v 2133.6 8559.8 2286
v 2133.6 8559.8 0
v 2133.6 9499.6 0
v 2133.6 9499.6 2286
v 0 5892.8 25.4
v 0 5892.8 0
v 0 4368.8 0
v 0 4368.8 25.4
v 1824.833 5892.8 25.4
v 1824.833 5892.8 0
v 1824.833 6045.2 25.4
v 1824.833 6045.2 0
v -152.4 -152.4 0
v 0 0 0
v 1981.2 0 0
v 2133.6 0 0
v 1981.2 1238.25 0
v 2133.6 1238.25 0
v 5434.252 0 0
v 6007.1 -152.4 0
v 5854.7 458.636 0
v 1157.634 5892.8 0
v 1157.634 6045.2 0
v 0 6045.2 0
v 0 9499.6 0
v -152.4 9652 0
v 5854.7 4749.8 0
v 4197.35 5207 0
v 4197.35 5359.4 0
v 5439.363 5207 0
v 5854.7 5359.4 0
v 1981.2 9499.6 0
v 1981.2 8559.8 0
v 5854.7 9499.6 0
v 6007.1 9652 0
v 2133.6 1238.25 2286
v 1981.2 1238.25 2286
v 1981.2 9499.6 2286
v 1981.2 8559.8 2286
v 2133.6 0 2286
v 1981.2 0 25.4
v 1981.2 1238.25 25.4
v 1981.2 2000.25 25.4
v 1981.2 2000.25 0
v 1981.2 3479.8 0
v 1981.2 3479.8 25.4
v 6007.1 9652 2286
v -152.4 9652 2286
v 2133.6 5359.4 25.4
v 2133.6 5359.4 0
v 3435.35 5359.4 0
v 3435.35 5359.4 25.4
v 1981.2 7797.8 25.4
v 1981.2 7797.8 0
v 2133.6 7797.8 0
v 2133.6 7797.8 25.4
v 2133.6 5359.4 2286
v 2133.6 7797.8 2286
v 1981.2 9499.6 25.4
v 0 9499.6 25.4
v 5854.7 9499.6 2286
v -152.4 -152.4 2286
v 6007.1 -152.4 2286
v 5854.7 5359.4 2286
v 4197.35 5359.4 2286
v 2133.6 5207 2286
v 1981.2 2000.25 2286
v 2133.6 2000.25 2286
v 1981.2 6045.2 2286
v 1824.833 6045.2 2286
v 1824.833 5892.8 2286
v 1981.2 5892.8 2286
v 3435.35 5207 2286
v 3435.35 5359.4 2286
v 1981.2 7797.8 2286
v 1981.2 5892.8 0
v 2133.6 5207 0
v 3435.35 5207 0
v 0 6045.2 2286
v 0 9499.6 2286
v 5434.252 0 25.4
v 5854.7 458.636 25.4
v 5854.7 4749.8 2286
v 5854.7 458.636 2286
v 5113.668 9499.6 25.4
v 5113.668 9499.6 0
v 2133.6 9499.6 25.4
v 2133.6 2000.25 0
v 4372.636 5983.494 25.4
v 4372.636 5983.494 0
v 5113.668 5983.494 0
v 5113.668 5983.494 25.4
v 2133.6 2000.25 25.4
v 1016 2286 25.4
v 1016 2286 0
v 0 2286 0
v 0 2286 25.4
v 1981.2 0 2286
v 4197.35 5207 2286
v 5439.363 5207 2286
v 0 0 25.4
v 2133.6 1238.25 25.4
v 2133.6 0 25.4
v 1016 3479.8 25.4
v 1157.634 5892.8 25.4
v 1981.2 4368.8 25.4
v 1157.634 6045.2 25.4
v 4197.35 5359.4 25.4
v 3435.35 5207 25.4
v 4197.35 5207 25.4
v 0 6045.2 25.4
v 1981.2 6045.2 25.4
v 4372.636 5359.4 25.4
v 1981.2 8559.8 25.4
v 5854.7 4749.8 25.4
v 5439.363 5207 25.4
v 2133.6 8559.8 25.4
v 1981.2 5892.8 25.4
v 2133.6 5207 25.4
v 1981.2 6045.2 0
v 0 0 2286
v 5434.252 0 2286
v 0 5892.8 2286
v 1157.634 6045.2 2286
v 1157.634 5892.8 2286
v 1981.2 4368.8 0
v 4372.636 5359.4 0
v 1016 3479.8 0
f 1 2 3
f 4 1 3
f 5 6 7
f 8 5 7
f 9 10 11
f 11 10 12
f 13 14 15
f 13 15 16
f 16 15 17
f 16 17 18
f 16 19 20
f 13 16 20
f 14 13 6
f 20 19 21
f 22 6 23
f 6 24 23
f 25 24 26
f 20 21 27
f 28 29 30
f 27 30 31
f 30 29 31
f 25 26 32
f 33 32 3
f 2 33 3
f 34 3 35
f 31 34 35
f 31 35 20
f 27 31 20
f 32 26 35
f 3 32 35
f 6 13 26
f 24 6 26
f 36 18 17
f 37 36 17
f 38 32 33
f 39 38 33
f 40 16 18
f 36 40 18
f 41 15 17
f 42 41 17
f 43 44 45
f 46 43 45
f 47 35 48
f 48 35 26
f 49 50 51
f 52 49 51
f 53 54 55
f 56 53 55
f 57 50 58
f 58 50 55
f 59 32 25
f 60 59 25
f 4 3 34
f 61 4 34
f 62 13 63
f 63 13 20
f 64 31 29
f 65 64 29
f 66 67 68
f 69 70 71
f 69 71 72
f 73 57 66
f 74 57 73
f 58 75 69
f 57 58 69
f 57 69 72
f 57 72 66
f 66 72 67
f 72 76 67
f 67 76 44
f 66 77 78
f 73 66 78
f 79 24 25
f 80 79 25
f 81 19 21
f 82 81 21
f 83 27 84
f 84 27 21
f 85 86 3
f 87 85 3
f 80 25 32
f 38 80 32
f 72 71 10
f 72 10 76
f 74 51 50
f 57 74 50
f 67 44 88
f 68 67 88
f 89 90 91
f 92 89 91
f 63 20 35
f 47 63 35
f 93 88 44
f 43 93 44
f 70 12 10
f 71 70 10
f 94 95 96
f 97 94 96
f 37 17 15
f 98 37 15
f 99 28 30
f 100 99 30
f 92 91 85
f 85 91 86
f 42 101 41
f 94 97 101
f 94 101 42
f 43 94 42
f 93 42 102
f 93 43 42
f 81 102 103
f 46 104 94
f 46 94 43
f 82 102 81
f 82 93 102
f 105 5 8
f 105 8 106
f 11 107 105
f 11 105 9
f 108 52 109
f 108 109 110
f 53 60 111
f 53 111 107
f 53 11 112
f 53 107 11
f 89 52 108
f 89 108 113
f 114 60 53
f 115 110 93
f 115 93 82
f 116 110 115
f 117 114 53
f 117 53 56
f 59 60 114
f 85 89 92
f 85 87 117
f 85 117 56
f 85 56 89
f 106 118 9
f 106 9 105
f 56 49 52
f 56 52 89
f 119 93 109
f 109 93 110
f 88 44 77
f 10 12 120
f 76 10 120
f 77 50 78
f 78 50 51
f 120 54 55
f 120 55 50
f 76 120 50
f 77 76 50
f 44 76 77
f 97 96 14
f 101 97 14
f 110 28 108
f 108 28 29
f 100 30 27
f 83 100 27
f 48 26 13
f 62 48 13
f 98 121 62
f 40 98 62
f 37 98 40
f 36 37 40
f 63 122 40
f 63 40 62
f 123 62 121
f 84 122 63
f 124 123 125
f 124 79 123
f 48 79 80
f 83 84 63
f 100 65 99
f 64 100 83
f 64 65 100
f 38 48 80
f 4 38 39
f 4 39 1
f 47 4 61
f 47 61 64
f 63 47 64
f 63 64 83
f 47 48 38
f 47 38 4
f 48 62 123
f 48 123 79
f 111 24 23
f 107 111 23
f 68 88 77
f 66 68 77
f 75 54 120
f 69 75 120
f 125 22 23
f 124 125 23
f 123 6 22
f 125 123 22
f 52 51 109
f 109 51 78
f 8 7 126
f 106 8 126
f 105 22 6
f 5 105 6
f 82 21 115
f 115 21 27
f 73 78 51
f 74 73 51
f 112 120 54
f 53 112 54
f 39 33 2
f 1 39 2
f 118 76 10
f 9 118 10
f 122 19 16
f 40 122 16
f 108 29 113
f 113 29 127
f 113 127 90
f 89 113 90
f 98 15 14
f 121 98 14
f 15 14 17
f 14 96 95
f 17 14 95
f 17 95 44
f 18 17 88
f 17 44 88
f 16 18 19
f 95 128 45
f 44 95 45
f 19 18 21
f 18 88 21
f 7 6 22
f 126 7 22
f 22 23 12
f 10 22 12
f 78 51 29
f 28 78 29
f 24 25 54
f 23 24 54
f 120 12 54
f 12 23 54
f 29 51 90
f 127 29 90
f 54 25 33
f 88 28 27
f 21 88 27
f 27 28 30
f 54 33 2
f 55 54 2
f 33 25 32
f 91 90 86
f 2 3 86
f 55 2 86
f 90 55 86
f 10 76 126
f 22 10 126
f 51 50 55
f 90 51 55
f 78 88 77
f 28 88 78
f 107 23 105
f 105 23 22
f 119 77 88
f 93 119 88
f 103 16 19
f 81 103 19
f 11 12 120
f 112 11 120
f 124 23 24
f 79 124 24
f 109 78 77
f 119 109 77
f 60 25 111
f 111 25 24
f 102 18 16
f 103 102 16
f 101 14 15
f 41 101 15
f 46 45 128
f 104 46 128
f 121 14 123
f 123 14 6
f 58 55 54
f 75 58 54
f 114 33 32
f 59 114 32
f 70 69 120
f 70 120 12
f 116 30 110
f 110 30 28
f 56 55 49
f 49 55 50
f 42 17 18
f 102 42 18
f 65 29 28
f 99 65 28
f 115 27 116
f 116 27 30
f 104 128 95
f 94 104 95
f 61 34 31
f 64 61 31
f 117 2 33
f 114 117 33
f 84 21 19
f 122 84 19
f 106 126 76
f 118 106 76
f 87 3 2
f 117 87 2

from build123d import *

# Parameters (mm, degrees)
F1_DEPTH = 2286
F2_DEPTH = 25.4


with BuildPart() as f1:
    # F0 (on Top) → F1 (new body)
    with BuildSketch(Plane.XY):
        Polygon((6007.1, -152.4), (6007.1, 0), (6007.1, 9499.6), (6007.1, 9652), (5854.7, 9652), (0, 9652), (-152.4, 9652), (-152.4, 9499.6), (-152.4, 0), (-152.4, -152.4), (0, -152.4), (5854.7, -152.4), align=None)
        Polygon((5854.7, 458.635837), (5434.252262, 0), (2133.6, 0), (2133.6, 1238.25), (1981.2, 1238.25), (1981.2, 0), (0, 0), (0, 2286), (0, 4368.8), (0, 5892.8), (1157.634497, 5892.8), (1157.634497, 6045.2), (0, 6045.2), (0, 9499.6), (1981.2, 9499.6), (1981.2, 8559.8), (2133.6, 8559.8), (2133.6, 9499.6), (5113.667921, 9499.6), (5848.350048, 9499.6), (5854.7, 9499.6), (5854.7, 5983.494282), (5854.7, 5359.4), (5848.350048, 5359.4), (4372.635841, 5359.4), (4197.35, 5359.4), (4197.35, 5207), (5439.363331, 5207), (5854.7, 4749.8), align=None, mode=Mode.SUBTRACT)
        Polygon((1981.2, 5283.2), (1981.2, 4368.8), (1981.2, 3479.8), (1981.2, 2000.25), (2133.6, 2000.25), (2133.6, 3479.8), (2133.6, 4368.8), (2133.6, 5207), (3435.35, 5207), (3435.35, 5359.4), (2133.6, 5359.4), (2133.6, 5969), (2133.6, 7797.8), (1981.2, 7797.8), (1981.2, 6045.2), (1824.832678, 6045.2), (1824.832678, 5892.8), (1981.2, 5892.8), align=None)
    extrude(amount=F1_DEPTH)


with BuildPart() as f2:
    # F0 (on Top) → F2 (new body)
    with BuildSketch(Plane.XY):
        Polygon((2133.6, 0), (5434.252262, 0), (5854.7, 458.635837), (5854.7, 4749.8), (5439.363331, 5207), (4197.35, 5207), (4197.35, 5359.4), (4372.635841, 5359.4), (4372.635841, 5983.494282), (5113.667921, 5983.494282), (5113.667921, 9499.6), (2133.6, 9499.6), (2133.6, 8559.8), (1981.2, 8559.8), (1981.2, 9499.6), (0, 9499.6), (0, 6045.2), (1157.634497, 6045.2), (1157.634497, 5892.8), (0, 5892.8), (0, 4368.8), (1981.2, 4368.8), (1981.2, 5283.2), (1981.2, 5892.8), (1824.832678, 5892.8), (1824.832678, 6045.2), (1981.2, 6045.2), (1981.2, 7797.8), (2133.6, 7797.8), (2133.6, 5969), (2133.6, 5359.4), (3435.35, 5359.4), (3435.35, 5207), (2133.6, 5207), (2133.6, 4368.8), (2133.6, 3479.8), (2133.6, 2000.25), (1981.2, 2000.25), (1981.2, 3479.8), (1016, 3479.8), (1016, 2286), (0, 2286), (0, 0), (1981.2, 0), (1981.2, 1238.25), (2133.6, 1238.25), align=None)
    extrude(amount=F2_DEPTH)


solid = Compound([f1.part, f2.part])
